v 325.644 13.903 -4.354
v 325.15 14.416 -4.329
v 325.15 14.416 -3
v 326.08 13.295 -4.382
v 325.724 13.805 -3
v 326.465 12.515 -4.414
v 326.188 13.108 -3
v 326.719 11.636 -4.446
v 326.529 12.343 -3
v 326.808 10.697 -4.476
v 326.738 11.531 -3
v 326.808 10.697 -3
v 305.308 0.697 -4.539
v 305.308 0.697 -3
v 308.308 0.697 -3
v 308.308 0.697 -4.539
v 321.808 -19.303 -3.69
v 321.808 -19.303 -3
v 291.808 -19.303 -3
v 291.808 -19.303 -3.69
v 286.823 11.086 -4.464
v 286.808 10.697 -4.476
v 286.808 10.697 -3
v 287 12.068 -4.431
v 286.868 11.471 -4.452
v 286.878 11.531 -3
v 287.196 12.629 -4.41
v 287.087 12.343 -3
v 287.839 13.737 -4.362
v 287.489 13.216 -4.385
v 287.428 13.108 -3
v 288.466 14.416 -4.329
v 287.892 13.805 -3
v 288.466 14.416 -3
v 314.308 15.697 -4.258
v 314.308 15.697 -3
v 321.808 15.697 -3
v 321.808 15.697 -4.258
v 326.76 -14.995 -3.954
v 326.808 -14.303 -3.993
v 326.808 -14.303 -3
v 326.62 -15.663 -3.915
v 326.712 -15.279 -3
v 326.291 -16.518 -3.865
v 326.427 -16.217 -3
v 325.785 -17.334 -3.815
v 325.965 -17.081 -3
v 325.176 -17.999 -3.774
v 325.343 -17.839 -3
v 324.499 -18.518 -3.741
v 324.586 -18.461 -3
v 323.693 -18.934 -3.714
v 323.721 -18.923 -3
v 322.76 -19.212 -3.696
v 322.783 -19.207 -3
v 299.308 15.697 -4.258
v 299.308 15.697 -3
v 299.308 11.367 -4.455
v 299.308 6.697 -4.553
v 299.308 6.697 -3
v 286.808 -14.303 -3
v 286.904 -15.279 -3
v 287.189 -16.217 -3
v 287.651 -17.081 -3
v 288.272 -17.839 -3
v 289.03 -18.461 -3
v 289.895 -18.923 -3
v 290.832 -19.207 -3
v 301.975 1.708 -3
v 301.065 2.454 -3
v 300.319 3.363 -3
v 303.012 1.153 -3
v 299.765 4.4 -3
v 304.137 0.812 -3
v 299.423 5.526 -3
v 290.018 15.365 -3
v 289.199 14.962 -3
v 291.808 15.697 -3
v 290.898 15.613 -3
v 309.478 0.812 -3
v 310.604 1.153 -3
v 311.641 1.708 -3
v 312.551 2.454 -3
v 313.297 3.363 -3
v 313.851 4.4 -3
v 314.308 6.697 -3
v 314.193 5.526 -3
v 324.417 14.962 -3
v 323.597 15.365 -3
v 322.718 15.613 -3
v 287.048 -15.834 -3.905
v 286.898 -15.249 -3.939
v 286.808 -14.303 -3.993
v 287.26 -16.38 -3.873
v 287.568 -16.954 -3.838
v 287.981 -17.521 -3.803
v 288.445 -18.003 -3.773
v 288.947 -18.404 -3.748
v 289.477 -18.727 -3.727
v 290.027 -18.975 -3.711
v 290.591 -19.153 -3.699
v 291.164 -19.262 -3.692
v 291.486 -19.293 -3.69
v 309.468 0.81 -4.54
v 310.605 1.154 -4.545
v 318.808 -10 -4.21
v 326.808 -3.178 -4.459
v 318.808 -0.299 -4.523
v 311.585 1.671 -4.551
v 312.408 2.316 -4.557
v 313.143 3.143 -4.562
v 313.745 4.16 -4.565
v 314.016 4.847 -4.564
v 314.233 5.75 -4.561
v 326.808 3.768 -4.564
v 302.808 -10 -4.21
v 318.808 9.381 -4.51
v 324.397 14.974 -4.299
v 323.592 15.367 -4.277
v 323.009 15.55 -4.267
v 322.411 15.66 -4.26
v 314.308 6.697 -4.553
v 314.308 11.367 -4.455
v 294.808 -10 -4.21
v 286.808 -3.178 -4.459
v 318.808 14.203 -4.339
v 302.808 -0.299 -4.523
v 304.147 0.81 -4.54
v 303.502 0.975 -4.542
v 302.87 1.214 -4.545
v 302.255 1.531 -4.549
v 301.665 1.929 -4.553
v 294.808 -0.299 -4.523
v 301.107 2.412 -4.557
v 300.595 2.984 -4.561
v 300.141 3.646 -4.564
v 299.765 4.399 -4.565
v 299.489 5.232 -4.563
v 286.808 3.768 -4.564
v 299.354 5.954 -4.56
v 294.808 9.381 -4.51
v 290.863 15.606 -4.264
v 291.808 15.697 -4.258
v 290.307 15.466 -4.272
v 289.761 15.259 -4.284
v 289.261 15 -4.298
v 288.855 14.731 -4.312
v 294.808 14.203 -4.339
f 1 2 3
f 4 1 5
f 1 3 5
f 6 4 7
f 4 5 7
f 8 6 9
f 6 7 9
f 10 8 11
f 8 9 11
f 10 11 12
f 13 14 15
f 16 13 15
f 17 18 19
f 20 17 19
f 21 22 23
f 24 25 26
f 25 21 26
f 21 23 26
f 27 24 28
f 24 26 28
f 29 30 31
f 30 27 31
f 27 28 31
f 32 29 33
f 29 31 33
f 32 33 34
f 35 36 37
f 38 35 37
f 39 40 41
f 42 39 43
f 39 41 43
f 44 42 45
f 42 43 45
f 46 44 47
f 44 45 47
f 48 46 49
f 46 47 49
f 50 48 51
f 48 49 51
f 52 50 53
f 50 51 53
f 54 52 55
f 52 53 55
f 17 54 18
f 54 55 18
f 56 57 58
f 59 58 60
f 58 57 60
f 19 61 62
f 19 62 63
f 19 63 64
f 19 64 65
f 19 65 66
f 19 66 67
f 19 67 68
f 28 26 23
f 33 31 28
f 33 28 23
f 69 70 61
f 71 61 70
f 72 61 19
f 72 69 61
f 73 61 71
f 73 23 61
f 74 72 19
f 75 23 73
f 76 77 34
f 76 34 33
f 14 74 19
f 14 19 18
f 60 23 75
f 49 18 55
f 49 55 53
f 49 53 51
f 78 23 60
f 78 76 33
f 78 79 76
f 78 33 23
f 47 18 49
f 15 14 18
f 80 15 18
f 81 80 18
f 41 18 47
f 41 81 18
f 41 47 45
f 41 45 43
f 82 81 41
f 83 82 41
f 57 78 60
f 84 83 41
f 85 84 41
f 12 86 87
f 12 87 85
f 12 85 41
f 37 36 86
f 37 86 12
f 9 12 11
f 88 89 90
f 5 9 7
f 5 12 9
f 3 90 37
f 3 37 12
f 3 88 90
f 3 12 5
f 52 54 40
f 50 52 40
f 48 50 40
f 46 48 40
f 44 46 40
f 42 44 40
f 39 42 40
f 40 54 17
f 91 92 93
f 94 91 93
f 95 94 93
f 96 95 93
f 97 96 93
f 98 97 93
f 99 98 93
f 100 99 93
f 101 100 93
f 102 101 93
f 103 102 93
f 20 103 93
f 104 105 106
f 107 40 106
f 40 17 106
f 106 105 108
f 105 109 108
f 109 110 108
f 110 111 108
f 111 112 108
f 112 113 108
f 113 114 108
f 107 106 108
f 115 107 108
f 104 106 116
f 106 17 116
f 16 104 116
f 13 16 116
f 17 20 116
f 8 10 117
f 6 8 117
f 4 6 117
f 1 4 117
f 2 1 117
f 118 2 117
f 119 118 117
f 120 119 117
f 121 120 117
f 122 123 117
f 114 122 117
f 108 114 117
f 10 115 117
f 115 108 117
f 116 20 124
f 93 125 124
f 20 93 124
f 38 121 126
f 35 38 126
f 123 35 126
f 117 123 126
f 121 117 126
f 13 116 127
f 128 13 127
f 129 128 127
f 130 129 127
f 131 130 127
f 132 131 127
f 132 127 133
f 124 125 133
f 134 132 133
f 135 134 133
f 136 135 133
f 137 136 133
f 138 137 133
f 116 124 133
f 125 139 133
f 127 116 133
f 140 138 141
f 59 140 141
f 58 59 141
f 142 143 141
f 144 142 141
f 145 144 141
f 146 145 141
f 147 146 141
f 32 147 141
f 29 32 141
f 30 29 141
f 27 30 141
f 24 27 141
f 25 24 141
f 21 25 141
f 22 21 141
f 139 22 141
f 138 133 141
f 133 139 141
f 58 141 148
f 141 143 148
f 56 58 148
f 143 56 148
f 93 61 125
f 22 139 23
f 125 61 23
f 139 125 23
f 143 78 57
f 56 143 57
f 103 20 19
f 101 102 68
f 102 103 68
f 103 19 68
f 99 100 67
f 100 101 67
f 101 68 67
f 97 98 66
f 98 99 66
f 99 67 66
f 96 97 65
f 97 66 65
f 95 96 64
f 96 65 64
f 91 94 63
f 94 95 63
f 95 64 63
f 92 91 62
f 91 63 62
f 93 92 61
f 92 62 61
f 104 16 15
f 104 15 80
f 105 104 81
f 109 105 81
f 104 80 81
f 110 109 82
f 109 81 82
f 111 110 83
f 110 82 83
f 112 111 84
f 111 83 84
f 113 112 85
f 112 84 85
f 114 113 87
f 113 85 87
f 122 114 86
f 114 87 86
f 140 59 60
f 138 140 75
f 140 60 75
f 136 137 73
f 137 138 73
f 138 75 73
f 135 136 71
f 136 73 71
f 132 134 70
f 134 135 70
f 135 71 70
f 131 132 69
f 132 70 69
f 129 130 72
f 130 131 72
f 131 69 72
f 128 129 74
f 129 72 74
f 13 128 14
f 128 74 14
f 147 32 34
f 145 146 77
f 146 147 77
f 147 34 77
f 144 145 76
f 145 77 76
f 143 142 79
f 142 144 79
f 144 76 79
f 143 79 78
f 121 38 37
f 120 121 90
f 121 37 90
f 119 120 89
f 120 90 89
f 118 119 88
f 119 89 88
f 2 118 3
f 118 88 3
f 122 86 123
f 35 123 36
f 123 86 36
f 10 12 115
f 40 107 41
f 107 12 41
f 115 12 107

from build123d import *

# Parameters (mm, degrees)
BOSS_EXTRUDE1_DEPTH = 5
CUT_EXTRUDE1_DEPTH  = 5
CAVITY1_START       = 286.807940561
CAVITY1_DEPTH       = 40
CUT_EXTRUDE2_DEPTH  = 3


# Read off the part's stored shape, not the designer's step: Cavity1
with BuildPart() as part:
    # Sketch1 → Boss-Extrude1 (new body)
    with BuildSketch(Plane.XY):
        with BuildLine():
            Line((326.807940561, 10.696584157), (326.807940561, -14.303415843))
            ThreePointArc((326.807940561, -14.303415843), (325.343474467, -17.838949749), (321.807940561, -19.303415843))
            Line((321.807940561, -19.303415843), (291.807940561, -19.303415843))
            ThreePointArc((291.807940561, -19.303415843), (288.272406655, -17.838949749), (286.807940561, -14.303415843))
            Line((286.807940561, -14.303415843), (286.807940561, 10.696584157))
            ThreePointArc((286.807940561, 10.696584157), (287.241237169, 12.732565524), (288.466028612, 14.415673363))
            ThreePointArc((288.466028612, 14.415673363), (290.018449856, 15.365387324), (291.807940561, 15.696584157))
            Line((291.807940561, 15.696584157), (321.807940561, 15.696584157))
            ThreePointArc((321.807940561, 15.696584157), (323.597431267, 15.365387324), (325.14985251, 14.415673363))
            ThreePointArc((325.14985251, 14.415673363), (326.374643954, 12.732565524), (326.807940561, 10.696584157))
        make_face()
    extrude(amount=-BOSS_EXTRUDE1_DEPTH)

    # Sketch2 → Cut-Extrude1 (cut)
    with BuildSketch(Plane.XY):
        with BuildLine():
            Line((314.307940561, 15.696584157), (299.307940561, 15.696584157))
            Line((299.307940561, 15.696584157), (299.307940561, 6.696584157))
            ThreePointArc((299.307940561, 6.696584157), (301.065299874, 2.45394347), (305.307940561, 0.696584157))
            Line((305.307940561, 0.696584157), (308.307940561, 0.696584157))
            ThreePointArc((308.307940561, 0.696584157), (312.550581249, 2.45394347), (314.307940561, 6.696584157))
            Line((314.307940561, 6.696584157), (314.307940561, 15.696584157))
        make_face()
    extrude(amount=-CUT_EXTRUDE1_DEPTH, mode=Mode.SUBTRACT)

    # Cavity1 outline → Cavity1 (cut)
    with BuildSketch(Plane.YZ.offset(CAVITY1_START)):
        with BuildLine():
            add(Edge.make_bspline(
                [(-19.303419089, -3.689556548), (-16.202204445, -3.892989258), (-9.864860791, -4.253224972), (-0.295866357, -4.576033421), (7.774910047, -4.584255677), (13.098555958, -4.40143973), (15.199220063, -4.287786884), (15.696587408, -4.2583405)],
                knots=[0.587686308, 0.587686308, 0.587686308, 0.587686308, 0.628495956, 0.671074693, 0.71365343, 0.734942799, 0.741555068, 0.741555068, 0.741555068, 0.741555068], degree=3))
            Line((-19.303419089, -3.689556548), (-19.303415843, -5))
            Line((-19.303415843, -5), (15.696584157, -5))
            Line((15.696584157, -5), (15.696587408, -4.2583405))
        make_face()
    extrude(amount=CAVITY1_DEPTH, mode=Mode.SUBTRACT)

    # Sketch3 → Cut-Extrude2 (cut)
    with BuildSketch(Plane.XY):
        with BuildLine():
            Line((314.307940561, 15.696584157), (314.307940561, 6.696584157))
            ThreePointArc((314.307940561, 6.696584157), (312.550581249, 2.45394347), (308.307940561, 0.696584157))
            Line((308.307940561, 0.696584157), (305.307940561, 0.696584157))
            ThreePointArc((305.307940561, 0.696584157), (301.065299874, 2.45394347), (299.307940561, 6.696584157))
            Line((299.307940561, 6.696584157), (299.307940561, 15.696584157))
            Line((299.307940561, 15.696584157), (291.807940561, 15.696584157))
            ThreePointArc((291.807940561, 15.696584157), (288.272406655, 14.232118063), (286.807940561, 10.696584157))
            Line((286.807940561, 10.696584157), (286.807940561, -14.303415843))
            ThreePointArc((286.807940561, -14.303415843), (288.272406655, -17.838949749), (291.807940561, -19.303415843))
            Line((291.807940561, -19.303415843), (321.807940561, -19.303415843))
            ThreePointArc((321.807940561, -19.303415843), (325.343474467, -17.838949749), (326.807940561, -14.303415843))
            Line((326.807940561, -14.303415843), (326.807940561, 10.696584157))
            ThreePointArc((326.807940561, 10.696584157), (325.343474467, 14.232118063), (321.807940561, 15.696584157))
            Line((321.807940561, 15.696584157), (314.307940561, 15.696584157))
        make_face()
    extrude(amount=-CUT_EXTRUDE2_DEPTH, mode=Mode.SUBTRACT)


solid = part.part
